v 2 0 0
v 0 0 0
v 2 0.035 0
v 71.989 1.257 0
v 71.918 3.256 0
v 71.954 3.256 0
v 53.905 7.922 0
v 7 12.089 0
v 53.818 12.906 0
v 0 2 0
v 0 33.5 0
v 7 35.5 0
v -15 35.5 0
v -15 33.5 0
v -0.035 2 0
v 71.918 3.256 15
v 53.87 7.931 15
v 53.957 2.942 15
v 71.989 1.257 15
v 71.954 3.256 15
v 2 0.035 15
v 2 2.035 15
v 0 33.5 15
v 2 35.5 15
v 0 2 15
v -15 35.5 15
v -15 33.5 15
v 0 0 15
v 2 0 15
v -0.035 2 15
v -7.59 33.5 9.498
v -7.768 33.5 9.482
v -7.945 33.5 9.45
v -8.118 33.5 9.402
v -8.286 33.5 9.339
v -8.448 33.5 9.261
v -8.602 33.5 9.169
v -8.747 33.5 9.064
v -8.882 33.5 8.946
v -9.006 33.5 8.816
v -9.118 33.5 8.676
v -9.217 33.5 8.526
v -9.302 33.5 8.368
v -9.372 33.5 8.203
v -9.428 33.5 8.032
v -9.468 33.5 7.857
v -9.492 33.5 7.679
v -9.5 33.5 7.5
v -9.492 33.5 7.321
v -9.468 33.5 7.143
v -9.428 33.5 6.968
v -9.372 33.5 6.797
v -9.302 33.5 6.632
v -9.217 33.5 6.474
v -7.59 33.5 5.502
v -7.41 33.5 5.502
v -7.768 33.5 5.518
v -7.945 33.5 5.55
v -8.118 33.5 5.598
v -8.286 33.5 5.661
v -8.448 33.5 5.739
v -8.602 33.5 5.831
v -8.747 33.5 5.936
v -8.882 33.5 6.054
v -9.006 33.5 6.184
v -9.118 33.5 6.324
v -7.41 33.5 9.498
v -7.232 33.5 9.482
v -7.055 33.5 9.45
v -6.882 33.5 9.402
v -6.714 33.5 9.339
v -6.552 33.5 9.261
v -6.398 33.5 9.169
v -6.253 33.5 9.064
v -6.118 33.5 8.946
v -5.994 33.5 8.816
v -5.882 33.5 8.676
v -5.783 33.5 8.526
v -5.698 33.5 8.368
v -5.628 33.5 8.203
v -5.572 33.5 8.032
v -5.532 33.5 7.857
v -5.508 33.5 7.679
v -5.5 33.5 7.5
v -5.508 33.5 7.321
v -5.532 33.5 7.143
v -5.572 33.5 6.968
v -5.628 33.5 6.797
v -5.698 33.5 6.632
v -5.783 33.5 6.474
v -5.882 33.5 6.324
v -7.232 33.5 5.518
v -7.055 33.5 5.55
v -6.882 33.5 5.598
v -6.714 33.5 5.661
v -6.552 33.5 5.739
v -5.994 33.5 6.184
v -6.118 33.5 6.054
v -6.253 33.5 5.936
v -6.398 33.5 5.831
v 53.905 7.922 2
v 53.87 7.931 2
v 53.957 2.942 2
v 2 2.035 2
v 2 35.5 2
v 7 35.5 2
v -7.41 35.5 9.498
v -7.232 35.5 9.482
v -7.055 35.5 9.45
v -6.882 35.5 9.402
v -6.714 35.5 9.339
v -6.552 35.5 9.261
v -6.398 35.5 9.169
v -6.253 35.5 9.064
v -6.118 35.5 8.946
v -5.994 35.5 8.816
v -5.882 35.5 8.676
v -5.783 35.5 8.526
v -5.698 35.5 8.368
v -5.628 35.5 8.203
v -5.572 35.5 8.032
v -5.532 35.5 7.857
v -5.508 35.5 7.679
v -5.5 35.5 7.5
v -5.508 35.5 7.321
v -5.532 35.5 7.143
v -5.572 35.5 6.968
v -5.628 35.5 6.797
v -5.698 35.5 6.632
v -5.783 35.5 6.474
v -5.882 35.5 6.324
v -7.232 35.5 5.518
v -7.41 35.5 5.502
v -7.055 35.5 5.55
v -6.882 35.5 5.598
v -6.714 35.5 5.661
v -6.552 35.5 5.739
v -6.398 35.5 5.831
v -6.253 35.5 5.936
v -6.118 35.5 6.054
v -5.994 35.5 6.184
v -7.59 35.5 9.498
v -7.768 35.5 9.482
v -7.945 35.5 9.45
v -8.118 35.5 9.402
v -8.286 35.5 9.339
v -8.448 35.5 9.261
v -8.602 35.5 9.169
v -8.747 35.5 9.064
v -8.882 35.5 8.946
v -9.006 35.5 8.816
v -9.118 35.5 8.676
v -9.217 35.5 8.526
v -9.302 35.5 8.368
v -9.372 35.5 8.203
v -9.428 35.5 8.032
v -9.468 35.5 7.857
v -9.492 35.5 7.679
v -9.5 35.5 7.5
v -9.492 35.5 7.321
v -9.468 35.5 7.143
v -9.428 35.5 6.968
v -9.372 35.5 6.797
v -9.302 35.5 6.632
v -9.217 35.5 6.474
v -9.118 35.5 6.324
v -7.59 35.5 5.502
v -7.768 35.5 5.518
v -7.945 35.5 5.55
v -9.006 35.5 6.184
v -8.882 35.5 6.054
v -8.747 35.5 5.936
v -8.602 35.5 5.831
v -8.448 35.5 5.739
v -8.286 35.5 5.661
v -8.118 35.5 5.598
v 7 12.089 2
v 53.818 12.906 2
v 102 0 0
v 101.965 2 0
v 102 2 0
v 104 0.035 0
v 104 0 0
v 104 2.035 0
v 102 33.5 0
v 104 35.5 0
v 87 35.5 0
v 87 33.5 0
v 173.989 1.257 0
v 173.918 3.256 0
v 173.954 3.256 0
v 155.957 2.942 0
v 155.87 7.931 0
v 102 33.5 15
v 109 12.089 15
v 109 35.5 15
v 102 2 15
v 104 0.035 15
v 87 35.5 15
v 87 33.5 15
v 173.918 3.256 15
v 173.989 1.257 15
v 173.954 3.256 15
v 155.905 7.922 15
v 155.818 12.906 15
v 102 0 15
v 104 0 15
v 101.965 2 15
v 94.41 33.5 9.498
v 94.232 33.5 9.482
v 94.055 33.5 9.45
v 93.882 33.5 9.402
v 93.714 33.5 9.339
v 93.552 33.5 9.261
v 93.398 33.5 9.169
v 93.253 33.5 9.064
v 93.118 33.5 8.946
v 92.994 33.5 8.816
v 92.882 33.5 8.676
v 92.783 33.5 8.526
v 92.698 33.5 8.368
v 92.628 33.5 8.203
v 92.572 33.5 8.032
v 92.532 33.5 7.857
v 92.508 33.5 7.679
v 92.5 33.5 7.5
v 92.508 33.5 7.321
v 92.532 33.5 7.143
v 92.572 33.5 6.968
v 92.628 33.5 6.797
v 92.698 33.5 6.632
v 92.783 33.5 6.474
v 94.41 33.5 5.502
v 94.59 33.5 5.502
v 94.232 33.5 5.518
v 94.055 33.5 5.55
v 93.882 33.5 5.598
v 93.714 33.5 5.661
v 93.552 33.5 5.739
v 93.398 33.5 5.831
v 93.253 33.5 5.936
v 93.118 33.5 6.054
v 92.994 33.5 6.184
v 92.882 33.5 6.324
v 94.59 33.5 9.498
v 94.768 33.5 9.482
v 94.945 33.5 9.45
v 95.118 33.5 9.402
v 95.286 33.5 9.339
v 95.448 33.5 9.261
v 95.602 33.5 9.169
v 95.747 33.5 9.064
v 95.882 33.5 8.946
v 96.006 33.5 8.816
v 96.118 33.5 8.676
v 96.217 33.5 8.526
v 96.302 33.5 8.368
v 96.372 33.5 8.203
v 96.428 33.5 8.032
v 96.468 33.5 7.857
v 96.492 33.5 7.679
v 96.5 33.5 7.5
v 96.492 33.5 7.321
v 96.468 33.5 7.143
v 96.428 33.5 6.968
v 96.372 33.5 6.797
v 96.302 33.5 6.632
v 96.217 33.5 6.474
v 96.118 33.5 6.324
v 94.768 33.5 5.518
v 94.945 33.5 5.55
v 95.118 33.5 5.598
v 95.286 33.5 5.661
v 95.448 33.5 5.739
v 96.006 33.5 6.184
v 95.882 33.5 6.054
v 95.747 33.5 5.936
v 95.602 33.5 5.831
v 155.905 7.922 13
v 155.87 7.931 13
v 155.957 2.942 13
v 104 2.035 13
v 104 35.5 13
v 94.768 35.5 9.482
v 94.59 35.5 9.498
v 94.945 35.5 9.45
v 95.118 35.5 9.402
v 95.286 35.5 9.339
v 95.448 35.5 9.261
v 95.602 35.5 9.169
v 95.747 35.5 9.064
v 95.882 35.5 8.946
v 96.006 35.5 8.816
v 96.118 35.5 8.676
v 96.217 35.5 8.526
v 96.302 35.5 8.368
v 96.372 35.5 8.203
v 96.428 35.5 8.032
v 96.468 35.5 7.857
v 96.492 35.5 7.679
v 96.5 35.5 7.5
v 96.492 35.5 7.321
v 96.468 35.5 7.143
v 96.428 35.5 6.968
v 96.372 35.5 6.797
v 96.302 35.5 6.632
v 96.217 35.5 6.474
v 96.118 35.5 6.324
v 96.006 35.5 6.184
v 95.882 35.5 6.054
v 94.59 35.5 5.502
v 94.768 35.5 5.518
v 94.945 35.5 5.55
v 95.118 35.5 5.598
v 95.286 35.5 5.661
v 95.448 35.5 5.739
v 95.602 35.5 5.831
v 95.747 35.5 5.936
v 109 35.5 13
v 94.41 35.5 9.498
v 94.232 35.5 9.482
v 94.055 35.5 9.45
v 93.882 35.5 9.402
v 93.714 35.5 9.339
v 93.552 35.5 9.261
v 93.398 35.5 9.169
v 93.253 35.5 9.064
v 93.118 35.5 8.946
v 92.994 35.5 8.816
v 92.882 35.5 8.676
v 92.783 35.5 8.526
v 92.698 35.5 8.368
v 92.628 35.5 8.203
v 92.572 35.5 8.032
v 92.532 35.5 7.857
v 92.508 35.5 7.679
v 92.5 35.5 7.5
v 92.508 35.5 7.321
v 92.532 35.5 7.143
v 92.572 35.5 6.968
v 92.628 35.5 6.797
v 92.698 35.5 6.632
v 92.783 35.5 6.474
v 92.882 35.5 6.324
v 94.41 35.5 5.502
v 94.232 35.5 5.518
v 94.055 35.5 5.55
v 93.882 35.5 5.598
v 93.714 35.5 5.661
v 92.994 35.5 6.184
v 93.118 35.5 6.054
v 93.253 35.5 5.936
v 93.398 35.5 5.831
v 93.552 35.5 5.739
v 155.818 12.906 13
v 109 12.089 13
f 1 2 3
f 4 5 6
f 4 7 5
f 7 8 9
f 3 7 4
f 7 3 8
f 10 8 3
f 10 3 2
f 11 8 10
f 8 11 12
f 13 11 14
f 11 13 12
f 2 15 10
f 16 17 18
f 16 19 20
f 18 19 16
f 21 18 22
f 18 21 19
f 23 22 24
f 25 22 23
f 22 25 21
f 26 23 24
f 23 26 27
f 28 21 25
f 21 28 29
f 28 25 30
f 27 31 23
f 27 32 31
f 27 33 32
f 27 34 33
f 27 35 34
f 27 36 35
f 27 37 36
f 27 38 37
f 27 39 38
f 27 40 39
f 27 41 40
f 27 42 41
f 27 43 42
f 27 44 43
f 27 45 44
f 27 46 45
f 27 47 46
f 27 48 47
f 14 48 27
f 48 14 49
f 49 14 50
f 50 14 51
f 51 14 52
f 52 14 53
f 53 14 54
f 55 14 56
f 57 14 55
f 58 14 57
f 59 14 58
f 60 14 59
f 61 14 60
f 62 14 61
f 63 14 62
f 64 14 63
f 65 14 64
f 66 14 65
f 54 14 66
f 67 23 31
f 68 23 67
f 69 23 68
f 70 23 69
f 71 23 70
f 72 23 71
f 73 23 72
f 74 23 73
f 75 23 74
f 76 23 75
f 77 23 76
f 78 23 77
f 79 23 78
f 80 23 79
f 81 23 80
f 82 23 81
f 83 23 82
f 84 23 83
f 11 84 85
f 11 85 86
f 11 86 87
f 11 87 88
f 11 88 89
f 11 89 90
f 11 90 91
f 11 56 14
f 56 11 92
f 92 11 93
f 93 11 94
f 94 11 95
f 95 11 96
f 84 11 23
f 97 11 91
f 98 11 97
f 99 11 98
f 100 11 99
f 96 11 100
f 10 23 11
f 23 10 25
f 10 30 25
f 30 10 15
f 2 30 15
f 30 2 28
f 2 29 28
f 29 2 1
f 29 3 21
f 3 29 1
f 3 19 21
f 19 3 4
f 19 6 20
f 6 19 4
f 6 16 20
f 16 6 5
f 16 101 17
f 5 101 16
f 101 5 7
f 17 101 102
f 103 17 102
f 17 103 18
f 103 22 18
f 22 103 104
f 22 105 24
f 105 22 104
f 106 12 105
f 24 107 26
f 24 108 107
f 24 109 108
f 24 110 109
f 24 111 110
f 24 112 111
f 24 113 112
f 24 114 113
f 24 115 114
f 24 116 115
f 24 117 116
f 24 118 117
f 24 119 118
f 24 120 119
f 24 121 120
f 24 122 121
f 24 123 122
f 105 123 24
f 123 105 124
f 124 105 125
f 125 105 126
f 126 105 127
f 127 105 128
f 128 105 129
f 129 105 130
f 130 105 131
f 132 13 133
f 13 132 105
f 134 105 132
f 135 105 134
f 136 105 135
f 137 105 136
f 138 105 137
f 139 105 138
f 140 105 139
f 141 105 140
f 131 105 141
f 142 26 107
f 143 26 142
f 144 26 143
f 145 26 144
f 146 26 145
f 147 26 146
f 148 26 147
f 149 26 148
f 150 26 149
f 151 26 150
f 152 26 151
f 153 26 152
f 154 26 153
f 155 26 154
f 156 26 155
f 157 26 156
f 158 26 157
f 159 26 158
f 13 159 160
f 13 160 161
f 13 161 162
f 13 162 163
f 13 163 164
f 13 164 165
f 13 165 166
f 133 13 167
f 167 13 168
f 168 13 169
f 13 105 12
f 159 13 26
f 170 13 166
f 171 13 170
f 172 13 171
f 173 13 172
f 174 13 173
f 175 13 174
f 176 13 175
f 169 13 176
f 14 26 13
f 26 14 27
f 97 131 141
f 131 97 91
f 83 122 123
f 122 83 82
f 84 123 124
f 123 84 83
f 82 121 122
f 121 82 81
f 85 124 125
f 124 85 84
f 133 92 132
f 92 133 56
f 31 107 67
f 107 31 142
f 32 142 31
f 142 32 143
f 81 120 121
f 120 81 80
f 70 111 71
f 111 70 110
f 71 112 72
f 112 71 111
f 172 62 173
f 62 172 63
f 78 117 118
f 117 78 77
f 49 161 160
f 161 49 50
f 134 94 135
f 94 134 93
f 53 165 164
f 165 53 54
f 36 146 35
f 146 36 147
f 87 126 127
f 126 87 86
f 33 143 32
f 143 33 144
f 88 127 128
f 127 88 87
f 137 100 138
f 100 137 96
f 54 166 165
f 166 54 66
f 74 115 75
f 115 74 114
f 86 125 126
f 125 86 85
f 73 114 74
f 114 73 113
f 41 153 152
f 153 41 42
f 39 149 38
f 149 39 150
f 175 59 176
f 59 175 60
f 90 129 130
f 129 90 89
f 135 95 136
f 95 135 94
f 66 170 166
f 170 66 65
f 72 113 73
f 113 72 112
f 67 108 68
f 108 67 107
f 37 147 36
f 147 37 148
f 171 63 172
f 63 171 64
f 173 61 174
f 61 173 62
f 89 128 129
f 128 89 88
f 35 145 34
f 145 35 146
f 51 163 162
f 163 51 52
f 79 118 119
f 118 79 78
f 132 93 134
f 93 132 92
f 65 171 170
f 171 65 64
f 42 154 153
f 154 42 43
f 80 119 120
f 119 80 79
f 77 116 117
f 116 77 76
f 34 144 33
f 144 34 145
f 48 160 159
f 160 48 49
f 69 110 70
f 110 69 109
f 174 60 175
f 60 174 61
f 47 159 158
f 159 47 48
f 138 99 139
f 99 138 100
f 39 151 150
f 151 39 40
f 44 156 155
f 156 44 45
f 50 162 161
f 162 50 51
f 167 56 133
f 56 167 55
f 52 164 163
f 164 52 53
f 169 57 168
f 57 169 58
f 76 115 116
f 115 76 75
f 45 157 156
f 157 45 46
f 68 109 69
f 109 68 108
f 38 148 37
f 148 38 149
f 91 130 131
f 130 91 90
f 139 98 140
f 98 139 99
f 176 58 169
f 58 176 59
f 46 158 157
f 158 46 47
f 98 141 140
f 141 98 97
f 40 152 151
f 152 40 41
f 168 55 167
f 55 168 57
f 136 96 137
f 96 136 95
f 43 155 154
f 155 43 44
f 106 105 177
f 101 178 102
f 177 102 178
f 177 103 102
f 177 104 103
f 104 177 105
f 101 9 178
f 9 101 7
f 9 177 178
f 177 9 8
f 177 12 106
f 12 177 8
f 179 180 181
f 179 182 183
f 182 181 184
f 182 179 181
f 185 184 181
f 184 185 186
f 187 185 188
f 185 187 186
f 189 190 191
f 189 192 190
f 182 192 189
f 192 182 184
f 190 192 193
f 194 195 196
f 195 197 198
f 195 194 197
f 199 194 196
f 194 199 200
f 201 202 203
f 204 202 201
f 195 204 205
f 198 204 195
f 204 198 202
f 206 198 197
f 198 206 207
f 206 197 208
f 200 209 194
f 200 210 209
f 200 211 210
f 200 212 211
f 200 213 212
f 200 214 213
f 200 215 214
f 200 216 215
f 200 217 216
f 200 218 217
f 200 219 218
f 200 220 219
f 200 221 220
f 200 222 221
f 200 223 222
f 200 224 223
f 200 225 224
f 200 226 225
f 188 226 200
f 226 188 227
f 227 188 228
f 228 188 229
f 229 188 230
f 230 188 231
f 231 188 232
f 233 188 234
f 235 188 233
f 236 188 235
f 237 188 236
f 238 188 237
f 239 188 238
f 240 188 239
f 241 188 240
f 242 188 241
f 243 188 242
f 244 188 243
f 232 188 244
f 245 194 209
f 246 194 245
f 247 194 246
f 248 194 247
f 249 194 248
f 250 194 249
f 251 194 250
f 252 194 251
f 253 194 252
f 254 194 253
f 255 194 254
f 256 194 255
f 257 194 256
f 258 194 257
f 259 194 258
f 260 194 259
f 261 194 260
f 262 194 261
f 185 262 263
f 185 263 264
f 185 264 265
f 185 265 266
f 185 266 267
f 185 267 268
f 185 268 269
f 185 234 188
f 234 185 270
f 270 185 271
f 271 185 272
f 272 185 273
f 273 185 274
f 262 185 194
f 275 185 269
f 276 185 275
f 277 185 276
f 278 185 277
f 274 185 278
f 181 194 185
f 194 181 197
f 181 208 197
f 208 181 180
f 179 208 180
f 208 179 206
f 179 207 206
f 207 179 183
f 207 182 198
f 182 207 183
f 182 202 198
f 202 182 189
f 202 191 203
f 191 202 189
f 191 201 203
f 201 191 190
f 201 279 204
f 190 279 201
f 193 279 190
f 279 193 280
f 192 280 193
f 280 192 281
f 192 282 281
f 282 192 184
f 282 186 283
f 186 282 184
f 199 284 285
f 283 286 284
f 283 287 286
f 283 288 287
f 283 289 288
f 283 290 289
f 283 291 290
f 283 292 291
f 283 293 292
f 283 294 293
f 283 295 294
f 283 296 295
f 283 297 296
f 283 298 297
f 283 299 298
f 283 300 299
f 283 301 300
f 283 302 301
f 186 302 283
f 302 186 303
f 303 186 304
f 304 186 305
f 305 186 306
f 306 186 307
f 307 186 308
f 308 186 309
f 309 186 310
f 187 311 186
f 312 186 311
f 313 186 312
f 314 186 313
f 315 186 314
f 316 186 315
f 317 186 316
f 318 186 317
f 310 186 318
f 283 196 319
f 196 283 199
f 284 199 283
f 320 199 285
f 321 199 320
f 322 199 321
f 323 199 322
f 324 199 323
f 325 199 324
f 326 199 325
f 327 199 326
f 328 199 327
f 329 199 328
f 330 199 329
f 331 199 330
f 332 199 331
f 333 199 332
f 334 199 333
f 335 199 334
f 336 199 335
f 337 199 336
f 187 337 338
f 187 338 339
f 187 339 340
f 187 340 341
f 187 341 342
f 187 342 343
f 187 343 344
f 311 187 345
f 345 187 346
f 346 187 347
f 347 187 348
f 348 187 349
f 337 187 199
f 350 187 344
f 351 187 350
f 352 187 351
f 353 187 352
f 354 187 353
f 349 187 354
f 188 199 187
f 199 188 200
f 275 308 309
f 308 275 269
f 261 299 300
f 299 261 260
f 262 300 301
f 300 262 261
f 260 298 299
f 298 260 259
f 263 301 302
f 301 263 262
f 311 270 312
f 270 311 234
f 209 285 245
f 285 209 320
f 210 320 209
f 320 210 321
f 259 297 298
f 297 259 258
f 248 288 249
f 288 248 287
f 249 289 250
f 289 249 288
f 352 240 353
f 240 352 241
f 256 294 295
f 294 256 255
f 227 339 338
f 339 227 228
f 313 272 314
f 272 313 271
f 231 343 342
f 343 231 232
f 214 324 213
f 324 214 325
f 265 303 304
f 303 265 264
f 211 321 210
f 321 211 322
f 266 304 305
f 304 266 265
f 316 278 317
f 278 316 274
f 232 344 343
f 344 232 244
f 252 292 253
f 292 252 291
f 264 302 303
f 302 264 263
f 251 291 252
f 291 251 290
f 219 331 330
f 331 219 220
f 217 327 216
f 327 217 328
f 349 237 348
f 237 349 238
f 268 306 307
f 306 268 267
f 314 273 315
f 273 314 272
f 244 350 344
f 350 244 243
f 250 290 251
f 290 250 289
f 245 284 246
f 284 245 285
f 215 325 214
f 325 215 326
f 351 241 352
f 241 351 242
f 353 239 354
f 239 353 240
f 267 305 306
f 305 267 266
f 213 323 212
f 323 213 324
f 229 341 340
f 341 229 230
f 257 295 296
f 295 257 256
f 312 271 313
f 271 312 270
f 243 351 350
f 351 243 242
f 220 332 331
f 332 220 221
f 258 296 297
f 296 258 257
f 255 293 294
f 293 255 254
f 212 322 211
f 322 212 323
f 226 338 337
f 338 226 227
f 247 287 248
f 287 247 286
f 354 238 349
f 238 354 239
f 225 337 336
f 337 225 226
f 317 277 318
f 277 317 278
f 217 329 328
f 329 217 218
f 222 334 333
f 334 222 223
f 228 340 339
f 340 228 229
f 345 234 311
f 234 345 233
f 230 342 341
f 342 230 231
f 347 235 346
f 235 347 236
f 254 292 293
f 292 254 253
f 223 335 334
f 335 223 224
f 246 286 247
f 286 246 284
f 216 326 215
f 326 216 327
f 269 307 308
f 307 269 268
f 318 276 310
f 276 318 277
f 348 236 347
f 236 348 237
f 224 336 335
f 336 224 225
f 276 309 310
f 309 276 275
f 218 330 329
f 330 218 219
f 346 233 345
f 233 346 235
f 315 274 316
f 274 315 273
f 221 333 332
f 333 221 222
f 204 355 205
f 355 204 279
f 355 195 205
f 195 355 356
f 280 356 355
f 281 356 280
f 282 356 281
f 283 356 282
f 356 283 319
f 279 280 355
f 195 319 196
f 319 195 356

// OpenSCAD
// A pair of clips for holding a power brick

clip_width = 15;
wall_thicc = 2;

brick_width = 52;
brick_height = 33.5;

$fn=70;

module clip() {
    difference() {
        linear_extrude(clip_width) union() {
            square([wall_thicc, brick_height + wall_thicc]);
            translate([-15, brick_height])
                square([15, wall_thicc]);

            rotate(1)
                union() {
                    square([brick_width + 20, wall_thicc]);
                    polygon(points = [
                            [brick_width + wall_thicc, wall_thicc - .01],
                            [brick_width + wall_thicc, wall_thicc + 5 - .01],
                            [brick_width + 20,         wall_thicc - .01],
                    ]);
                }
        }

        translate([-7.5, brick_height + wall_thicc*1.5, clip_width/2])
        rotate([90, 0, 0])
        cylinder(h=wall_thicc*2, d=4);
    }
}

union() {
    clip();
    translate([wall_thicc, wall_thicc, 0])
        rotate(1)
        cube([brick_width, 10, wall_thicc]);
    translate([wall_thicc, wall_thicc, 0])
        cube([5, brick_height, wall_thicc]);
}

translate([brick_width + 50, 0, 0])
union() {
    clip();
    translate([0, 0, clip_width - wall_thicc]) {
        translate([wall_thicc, wall_thicc, 0])
            rotate(1)
            cube([brick_width, 10, wall_thicc]);
        translate([wall_thicc, wall_thicc, 0])
            cube([5, brick_height, wall_thicc]);
    }
}
